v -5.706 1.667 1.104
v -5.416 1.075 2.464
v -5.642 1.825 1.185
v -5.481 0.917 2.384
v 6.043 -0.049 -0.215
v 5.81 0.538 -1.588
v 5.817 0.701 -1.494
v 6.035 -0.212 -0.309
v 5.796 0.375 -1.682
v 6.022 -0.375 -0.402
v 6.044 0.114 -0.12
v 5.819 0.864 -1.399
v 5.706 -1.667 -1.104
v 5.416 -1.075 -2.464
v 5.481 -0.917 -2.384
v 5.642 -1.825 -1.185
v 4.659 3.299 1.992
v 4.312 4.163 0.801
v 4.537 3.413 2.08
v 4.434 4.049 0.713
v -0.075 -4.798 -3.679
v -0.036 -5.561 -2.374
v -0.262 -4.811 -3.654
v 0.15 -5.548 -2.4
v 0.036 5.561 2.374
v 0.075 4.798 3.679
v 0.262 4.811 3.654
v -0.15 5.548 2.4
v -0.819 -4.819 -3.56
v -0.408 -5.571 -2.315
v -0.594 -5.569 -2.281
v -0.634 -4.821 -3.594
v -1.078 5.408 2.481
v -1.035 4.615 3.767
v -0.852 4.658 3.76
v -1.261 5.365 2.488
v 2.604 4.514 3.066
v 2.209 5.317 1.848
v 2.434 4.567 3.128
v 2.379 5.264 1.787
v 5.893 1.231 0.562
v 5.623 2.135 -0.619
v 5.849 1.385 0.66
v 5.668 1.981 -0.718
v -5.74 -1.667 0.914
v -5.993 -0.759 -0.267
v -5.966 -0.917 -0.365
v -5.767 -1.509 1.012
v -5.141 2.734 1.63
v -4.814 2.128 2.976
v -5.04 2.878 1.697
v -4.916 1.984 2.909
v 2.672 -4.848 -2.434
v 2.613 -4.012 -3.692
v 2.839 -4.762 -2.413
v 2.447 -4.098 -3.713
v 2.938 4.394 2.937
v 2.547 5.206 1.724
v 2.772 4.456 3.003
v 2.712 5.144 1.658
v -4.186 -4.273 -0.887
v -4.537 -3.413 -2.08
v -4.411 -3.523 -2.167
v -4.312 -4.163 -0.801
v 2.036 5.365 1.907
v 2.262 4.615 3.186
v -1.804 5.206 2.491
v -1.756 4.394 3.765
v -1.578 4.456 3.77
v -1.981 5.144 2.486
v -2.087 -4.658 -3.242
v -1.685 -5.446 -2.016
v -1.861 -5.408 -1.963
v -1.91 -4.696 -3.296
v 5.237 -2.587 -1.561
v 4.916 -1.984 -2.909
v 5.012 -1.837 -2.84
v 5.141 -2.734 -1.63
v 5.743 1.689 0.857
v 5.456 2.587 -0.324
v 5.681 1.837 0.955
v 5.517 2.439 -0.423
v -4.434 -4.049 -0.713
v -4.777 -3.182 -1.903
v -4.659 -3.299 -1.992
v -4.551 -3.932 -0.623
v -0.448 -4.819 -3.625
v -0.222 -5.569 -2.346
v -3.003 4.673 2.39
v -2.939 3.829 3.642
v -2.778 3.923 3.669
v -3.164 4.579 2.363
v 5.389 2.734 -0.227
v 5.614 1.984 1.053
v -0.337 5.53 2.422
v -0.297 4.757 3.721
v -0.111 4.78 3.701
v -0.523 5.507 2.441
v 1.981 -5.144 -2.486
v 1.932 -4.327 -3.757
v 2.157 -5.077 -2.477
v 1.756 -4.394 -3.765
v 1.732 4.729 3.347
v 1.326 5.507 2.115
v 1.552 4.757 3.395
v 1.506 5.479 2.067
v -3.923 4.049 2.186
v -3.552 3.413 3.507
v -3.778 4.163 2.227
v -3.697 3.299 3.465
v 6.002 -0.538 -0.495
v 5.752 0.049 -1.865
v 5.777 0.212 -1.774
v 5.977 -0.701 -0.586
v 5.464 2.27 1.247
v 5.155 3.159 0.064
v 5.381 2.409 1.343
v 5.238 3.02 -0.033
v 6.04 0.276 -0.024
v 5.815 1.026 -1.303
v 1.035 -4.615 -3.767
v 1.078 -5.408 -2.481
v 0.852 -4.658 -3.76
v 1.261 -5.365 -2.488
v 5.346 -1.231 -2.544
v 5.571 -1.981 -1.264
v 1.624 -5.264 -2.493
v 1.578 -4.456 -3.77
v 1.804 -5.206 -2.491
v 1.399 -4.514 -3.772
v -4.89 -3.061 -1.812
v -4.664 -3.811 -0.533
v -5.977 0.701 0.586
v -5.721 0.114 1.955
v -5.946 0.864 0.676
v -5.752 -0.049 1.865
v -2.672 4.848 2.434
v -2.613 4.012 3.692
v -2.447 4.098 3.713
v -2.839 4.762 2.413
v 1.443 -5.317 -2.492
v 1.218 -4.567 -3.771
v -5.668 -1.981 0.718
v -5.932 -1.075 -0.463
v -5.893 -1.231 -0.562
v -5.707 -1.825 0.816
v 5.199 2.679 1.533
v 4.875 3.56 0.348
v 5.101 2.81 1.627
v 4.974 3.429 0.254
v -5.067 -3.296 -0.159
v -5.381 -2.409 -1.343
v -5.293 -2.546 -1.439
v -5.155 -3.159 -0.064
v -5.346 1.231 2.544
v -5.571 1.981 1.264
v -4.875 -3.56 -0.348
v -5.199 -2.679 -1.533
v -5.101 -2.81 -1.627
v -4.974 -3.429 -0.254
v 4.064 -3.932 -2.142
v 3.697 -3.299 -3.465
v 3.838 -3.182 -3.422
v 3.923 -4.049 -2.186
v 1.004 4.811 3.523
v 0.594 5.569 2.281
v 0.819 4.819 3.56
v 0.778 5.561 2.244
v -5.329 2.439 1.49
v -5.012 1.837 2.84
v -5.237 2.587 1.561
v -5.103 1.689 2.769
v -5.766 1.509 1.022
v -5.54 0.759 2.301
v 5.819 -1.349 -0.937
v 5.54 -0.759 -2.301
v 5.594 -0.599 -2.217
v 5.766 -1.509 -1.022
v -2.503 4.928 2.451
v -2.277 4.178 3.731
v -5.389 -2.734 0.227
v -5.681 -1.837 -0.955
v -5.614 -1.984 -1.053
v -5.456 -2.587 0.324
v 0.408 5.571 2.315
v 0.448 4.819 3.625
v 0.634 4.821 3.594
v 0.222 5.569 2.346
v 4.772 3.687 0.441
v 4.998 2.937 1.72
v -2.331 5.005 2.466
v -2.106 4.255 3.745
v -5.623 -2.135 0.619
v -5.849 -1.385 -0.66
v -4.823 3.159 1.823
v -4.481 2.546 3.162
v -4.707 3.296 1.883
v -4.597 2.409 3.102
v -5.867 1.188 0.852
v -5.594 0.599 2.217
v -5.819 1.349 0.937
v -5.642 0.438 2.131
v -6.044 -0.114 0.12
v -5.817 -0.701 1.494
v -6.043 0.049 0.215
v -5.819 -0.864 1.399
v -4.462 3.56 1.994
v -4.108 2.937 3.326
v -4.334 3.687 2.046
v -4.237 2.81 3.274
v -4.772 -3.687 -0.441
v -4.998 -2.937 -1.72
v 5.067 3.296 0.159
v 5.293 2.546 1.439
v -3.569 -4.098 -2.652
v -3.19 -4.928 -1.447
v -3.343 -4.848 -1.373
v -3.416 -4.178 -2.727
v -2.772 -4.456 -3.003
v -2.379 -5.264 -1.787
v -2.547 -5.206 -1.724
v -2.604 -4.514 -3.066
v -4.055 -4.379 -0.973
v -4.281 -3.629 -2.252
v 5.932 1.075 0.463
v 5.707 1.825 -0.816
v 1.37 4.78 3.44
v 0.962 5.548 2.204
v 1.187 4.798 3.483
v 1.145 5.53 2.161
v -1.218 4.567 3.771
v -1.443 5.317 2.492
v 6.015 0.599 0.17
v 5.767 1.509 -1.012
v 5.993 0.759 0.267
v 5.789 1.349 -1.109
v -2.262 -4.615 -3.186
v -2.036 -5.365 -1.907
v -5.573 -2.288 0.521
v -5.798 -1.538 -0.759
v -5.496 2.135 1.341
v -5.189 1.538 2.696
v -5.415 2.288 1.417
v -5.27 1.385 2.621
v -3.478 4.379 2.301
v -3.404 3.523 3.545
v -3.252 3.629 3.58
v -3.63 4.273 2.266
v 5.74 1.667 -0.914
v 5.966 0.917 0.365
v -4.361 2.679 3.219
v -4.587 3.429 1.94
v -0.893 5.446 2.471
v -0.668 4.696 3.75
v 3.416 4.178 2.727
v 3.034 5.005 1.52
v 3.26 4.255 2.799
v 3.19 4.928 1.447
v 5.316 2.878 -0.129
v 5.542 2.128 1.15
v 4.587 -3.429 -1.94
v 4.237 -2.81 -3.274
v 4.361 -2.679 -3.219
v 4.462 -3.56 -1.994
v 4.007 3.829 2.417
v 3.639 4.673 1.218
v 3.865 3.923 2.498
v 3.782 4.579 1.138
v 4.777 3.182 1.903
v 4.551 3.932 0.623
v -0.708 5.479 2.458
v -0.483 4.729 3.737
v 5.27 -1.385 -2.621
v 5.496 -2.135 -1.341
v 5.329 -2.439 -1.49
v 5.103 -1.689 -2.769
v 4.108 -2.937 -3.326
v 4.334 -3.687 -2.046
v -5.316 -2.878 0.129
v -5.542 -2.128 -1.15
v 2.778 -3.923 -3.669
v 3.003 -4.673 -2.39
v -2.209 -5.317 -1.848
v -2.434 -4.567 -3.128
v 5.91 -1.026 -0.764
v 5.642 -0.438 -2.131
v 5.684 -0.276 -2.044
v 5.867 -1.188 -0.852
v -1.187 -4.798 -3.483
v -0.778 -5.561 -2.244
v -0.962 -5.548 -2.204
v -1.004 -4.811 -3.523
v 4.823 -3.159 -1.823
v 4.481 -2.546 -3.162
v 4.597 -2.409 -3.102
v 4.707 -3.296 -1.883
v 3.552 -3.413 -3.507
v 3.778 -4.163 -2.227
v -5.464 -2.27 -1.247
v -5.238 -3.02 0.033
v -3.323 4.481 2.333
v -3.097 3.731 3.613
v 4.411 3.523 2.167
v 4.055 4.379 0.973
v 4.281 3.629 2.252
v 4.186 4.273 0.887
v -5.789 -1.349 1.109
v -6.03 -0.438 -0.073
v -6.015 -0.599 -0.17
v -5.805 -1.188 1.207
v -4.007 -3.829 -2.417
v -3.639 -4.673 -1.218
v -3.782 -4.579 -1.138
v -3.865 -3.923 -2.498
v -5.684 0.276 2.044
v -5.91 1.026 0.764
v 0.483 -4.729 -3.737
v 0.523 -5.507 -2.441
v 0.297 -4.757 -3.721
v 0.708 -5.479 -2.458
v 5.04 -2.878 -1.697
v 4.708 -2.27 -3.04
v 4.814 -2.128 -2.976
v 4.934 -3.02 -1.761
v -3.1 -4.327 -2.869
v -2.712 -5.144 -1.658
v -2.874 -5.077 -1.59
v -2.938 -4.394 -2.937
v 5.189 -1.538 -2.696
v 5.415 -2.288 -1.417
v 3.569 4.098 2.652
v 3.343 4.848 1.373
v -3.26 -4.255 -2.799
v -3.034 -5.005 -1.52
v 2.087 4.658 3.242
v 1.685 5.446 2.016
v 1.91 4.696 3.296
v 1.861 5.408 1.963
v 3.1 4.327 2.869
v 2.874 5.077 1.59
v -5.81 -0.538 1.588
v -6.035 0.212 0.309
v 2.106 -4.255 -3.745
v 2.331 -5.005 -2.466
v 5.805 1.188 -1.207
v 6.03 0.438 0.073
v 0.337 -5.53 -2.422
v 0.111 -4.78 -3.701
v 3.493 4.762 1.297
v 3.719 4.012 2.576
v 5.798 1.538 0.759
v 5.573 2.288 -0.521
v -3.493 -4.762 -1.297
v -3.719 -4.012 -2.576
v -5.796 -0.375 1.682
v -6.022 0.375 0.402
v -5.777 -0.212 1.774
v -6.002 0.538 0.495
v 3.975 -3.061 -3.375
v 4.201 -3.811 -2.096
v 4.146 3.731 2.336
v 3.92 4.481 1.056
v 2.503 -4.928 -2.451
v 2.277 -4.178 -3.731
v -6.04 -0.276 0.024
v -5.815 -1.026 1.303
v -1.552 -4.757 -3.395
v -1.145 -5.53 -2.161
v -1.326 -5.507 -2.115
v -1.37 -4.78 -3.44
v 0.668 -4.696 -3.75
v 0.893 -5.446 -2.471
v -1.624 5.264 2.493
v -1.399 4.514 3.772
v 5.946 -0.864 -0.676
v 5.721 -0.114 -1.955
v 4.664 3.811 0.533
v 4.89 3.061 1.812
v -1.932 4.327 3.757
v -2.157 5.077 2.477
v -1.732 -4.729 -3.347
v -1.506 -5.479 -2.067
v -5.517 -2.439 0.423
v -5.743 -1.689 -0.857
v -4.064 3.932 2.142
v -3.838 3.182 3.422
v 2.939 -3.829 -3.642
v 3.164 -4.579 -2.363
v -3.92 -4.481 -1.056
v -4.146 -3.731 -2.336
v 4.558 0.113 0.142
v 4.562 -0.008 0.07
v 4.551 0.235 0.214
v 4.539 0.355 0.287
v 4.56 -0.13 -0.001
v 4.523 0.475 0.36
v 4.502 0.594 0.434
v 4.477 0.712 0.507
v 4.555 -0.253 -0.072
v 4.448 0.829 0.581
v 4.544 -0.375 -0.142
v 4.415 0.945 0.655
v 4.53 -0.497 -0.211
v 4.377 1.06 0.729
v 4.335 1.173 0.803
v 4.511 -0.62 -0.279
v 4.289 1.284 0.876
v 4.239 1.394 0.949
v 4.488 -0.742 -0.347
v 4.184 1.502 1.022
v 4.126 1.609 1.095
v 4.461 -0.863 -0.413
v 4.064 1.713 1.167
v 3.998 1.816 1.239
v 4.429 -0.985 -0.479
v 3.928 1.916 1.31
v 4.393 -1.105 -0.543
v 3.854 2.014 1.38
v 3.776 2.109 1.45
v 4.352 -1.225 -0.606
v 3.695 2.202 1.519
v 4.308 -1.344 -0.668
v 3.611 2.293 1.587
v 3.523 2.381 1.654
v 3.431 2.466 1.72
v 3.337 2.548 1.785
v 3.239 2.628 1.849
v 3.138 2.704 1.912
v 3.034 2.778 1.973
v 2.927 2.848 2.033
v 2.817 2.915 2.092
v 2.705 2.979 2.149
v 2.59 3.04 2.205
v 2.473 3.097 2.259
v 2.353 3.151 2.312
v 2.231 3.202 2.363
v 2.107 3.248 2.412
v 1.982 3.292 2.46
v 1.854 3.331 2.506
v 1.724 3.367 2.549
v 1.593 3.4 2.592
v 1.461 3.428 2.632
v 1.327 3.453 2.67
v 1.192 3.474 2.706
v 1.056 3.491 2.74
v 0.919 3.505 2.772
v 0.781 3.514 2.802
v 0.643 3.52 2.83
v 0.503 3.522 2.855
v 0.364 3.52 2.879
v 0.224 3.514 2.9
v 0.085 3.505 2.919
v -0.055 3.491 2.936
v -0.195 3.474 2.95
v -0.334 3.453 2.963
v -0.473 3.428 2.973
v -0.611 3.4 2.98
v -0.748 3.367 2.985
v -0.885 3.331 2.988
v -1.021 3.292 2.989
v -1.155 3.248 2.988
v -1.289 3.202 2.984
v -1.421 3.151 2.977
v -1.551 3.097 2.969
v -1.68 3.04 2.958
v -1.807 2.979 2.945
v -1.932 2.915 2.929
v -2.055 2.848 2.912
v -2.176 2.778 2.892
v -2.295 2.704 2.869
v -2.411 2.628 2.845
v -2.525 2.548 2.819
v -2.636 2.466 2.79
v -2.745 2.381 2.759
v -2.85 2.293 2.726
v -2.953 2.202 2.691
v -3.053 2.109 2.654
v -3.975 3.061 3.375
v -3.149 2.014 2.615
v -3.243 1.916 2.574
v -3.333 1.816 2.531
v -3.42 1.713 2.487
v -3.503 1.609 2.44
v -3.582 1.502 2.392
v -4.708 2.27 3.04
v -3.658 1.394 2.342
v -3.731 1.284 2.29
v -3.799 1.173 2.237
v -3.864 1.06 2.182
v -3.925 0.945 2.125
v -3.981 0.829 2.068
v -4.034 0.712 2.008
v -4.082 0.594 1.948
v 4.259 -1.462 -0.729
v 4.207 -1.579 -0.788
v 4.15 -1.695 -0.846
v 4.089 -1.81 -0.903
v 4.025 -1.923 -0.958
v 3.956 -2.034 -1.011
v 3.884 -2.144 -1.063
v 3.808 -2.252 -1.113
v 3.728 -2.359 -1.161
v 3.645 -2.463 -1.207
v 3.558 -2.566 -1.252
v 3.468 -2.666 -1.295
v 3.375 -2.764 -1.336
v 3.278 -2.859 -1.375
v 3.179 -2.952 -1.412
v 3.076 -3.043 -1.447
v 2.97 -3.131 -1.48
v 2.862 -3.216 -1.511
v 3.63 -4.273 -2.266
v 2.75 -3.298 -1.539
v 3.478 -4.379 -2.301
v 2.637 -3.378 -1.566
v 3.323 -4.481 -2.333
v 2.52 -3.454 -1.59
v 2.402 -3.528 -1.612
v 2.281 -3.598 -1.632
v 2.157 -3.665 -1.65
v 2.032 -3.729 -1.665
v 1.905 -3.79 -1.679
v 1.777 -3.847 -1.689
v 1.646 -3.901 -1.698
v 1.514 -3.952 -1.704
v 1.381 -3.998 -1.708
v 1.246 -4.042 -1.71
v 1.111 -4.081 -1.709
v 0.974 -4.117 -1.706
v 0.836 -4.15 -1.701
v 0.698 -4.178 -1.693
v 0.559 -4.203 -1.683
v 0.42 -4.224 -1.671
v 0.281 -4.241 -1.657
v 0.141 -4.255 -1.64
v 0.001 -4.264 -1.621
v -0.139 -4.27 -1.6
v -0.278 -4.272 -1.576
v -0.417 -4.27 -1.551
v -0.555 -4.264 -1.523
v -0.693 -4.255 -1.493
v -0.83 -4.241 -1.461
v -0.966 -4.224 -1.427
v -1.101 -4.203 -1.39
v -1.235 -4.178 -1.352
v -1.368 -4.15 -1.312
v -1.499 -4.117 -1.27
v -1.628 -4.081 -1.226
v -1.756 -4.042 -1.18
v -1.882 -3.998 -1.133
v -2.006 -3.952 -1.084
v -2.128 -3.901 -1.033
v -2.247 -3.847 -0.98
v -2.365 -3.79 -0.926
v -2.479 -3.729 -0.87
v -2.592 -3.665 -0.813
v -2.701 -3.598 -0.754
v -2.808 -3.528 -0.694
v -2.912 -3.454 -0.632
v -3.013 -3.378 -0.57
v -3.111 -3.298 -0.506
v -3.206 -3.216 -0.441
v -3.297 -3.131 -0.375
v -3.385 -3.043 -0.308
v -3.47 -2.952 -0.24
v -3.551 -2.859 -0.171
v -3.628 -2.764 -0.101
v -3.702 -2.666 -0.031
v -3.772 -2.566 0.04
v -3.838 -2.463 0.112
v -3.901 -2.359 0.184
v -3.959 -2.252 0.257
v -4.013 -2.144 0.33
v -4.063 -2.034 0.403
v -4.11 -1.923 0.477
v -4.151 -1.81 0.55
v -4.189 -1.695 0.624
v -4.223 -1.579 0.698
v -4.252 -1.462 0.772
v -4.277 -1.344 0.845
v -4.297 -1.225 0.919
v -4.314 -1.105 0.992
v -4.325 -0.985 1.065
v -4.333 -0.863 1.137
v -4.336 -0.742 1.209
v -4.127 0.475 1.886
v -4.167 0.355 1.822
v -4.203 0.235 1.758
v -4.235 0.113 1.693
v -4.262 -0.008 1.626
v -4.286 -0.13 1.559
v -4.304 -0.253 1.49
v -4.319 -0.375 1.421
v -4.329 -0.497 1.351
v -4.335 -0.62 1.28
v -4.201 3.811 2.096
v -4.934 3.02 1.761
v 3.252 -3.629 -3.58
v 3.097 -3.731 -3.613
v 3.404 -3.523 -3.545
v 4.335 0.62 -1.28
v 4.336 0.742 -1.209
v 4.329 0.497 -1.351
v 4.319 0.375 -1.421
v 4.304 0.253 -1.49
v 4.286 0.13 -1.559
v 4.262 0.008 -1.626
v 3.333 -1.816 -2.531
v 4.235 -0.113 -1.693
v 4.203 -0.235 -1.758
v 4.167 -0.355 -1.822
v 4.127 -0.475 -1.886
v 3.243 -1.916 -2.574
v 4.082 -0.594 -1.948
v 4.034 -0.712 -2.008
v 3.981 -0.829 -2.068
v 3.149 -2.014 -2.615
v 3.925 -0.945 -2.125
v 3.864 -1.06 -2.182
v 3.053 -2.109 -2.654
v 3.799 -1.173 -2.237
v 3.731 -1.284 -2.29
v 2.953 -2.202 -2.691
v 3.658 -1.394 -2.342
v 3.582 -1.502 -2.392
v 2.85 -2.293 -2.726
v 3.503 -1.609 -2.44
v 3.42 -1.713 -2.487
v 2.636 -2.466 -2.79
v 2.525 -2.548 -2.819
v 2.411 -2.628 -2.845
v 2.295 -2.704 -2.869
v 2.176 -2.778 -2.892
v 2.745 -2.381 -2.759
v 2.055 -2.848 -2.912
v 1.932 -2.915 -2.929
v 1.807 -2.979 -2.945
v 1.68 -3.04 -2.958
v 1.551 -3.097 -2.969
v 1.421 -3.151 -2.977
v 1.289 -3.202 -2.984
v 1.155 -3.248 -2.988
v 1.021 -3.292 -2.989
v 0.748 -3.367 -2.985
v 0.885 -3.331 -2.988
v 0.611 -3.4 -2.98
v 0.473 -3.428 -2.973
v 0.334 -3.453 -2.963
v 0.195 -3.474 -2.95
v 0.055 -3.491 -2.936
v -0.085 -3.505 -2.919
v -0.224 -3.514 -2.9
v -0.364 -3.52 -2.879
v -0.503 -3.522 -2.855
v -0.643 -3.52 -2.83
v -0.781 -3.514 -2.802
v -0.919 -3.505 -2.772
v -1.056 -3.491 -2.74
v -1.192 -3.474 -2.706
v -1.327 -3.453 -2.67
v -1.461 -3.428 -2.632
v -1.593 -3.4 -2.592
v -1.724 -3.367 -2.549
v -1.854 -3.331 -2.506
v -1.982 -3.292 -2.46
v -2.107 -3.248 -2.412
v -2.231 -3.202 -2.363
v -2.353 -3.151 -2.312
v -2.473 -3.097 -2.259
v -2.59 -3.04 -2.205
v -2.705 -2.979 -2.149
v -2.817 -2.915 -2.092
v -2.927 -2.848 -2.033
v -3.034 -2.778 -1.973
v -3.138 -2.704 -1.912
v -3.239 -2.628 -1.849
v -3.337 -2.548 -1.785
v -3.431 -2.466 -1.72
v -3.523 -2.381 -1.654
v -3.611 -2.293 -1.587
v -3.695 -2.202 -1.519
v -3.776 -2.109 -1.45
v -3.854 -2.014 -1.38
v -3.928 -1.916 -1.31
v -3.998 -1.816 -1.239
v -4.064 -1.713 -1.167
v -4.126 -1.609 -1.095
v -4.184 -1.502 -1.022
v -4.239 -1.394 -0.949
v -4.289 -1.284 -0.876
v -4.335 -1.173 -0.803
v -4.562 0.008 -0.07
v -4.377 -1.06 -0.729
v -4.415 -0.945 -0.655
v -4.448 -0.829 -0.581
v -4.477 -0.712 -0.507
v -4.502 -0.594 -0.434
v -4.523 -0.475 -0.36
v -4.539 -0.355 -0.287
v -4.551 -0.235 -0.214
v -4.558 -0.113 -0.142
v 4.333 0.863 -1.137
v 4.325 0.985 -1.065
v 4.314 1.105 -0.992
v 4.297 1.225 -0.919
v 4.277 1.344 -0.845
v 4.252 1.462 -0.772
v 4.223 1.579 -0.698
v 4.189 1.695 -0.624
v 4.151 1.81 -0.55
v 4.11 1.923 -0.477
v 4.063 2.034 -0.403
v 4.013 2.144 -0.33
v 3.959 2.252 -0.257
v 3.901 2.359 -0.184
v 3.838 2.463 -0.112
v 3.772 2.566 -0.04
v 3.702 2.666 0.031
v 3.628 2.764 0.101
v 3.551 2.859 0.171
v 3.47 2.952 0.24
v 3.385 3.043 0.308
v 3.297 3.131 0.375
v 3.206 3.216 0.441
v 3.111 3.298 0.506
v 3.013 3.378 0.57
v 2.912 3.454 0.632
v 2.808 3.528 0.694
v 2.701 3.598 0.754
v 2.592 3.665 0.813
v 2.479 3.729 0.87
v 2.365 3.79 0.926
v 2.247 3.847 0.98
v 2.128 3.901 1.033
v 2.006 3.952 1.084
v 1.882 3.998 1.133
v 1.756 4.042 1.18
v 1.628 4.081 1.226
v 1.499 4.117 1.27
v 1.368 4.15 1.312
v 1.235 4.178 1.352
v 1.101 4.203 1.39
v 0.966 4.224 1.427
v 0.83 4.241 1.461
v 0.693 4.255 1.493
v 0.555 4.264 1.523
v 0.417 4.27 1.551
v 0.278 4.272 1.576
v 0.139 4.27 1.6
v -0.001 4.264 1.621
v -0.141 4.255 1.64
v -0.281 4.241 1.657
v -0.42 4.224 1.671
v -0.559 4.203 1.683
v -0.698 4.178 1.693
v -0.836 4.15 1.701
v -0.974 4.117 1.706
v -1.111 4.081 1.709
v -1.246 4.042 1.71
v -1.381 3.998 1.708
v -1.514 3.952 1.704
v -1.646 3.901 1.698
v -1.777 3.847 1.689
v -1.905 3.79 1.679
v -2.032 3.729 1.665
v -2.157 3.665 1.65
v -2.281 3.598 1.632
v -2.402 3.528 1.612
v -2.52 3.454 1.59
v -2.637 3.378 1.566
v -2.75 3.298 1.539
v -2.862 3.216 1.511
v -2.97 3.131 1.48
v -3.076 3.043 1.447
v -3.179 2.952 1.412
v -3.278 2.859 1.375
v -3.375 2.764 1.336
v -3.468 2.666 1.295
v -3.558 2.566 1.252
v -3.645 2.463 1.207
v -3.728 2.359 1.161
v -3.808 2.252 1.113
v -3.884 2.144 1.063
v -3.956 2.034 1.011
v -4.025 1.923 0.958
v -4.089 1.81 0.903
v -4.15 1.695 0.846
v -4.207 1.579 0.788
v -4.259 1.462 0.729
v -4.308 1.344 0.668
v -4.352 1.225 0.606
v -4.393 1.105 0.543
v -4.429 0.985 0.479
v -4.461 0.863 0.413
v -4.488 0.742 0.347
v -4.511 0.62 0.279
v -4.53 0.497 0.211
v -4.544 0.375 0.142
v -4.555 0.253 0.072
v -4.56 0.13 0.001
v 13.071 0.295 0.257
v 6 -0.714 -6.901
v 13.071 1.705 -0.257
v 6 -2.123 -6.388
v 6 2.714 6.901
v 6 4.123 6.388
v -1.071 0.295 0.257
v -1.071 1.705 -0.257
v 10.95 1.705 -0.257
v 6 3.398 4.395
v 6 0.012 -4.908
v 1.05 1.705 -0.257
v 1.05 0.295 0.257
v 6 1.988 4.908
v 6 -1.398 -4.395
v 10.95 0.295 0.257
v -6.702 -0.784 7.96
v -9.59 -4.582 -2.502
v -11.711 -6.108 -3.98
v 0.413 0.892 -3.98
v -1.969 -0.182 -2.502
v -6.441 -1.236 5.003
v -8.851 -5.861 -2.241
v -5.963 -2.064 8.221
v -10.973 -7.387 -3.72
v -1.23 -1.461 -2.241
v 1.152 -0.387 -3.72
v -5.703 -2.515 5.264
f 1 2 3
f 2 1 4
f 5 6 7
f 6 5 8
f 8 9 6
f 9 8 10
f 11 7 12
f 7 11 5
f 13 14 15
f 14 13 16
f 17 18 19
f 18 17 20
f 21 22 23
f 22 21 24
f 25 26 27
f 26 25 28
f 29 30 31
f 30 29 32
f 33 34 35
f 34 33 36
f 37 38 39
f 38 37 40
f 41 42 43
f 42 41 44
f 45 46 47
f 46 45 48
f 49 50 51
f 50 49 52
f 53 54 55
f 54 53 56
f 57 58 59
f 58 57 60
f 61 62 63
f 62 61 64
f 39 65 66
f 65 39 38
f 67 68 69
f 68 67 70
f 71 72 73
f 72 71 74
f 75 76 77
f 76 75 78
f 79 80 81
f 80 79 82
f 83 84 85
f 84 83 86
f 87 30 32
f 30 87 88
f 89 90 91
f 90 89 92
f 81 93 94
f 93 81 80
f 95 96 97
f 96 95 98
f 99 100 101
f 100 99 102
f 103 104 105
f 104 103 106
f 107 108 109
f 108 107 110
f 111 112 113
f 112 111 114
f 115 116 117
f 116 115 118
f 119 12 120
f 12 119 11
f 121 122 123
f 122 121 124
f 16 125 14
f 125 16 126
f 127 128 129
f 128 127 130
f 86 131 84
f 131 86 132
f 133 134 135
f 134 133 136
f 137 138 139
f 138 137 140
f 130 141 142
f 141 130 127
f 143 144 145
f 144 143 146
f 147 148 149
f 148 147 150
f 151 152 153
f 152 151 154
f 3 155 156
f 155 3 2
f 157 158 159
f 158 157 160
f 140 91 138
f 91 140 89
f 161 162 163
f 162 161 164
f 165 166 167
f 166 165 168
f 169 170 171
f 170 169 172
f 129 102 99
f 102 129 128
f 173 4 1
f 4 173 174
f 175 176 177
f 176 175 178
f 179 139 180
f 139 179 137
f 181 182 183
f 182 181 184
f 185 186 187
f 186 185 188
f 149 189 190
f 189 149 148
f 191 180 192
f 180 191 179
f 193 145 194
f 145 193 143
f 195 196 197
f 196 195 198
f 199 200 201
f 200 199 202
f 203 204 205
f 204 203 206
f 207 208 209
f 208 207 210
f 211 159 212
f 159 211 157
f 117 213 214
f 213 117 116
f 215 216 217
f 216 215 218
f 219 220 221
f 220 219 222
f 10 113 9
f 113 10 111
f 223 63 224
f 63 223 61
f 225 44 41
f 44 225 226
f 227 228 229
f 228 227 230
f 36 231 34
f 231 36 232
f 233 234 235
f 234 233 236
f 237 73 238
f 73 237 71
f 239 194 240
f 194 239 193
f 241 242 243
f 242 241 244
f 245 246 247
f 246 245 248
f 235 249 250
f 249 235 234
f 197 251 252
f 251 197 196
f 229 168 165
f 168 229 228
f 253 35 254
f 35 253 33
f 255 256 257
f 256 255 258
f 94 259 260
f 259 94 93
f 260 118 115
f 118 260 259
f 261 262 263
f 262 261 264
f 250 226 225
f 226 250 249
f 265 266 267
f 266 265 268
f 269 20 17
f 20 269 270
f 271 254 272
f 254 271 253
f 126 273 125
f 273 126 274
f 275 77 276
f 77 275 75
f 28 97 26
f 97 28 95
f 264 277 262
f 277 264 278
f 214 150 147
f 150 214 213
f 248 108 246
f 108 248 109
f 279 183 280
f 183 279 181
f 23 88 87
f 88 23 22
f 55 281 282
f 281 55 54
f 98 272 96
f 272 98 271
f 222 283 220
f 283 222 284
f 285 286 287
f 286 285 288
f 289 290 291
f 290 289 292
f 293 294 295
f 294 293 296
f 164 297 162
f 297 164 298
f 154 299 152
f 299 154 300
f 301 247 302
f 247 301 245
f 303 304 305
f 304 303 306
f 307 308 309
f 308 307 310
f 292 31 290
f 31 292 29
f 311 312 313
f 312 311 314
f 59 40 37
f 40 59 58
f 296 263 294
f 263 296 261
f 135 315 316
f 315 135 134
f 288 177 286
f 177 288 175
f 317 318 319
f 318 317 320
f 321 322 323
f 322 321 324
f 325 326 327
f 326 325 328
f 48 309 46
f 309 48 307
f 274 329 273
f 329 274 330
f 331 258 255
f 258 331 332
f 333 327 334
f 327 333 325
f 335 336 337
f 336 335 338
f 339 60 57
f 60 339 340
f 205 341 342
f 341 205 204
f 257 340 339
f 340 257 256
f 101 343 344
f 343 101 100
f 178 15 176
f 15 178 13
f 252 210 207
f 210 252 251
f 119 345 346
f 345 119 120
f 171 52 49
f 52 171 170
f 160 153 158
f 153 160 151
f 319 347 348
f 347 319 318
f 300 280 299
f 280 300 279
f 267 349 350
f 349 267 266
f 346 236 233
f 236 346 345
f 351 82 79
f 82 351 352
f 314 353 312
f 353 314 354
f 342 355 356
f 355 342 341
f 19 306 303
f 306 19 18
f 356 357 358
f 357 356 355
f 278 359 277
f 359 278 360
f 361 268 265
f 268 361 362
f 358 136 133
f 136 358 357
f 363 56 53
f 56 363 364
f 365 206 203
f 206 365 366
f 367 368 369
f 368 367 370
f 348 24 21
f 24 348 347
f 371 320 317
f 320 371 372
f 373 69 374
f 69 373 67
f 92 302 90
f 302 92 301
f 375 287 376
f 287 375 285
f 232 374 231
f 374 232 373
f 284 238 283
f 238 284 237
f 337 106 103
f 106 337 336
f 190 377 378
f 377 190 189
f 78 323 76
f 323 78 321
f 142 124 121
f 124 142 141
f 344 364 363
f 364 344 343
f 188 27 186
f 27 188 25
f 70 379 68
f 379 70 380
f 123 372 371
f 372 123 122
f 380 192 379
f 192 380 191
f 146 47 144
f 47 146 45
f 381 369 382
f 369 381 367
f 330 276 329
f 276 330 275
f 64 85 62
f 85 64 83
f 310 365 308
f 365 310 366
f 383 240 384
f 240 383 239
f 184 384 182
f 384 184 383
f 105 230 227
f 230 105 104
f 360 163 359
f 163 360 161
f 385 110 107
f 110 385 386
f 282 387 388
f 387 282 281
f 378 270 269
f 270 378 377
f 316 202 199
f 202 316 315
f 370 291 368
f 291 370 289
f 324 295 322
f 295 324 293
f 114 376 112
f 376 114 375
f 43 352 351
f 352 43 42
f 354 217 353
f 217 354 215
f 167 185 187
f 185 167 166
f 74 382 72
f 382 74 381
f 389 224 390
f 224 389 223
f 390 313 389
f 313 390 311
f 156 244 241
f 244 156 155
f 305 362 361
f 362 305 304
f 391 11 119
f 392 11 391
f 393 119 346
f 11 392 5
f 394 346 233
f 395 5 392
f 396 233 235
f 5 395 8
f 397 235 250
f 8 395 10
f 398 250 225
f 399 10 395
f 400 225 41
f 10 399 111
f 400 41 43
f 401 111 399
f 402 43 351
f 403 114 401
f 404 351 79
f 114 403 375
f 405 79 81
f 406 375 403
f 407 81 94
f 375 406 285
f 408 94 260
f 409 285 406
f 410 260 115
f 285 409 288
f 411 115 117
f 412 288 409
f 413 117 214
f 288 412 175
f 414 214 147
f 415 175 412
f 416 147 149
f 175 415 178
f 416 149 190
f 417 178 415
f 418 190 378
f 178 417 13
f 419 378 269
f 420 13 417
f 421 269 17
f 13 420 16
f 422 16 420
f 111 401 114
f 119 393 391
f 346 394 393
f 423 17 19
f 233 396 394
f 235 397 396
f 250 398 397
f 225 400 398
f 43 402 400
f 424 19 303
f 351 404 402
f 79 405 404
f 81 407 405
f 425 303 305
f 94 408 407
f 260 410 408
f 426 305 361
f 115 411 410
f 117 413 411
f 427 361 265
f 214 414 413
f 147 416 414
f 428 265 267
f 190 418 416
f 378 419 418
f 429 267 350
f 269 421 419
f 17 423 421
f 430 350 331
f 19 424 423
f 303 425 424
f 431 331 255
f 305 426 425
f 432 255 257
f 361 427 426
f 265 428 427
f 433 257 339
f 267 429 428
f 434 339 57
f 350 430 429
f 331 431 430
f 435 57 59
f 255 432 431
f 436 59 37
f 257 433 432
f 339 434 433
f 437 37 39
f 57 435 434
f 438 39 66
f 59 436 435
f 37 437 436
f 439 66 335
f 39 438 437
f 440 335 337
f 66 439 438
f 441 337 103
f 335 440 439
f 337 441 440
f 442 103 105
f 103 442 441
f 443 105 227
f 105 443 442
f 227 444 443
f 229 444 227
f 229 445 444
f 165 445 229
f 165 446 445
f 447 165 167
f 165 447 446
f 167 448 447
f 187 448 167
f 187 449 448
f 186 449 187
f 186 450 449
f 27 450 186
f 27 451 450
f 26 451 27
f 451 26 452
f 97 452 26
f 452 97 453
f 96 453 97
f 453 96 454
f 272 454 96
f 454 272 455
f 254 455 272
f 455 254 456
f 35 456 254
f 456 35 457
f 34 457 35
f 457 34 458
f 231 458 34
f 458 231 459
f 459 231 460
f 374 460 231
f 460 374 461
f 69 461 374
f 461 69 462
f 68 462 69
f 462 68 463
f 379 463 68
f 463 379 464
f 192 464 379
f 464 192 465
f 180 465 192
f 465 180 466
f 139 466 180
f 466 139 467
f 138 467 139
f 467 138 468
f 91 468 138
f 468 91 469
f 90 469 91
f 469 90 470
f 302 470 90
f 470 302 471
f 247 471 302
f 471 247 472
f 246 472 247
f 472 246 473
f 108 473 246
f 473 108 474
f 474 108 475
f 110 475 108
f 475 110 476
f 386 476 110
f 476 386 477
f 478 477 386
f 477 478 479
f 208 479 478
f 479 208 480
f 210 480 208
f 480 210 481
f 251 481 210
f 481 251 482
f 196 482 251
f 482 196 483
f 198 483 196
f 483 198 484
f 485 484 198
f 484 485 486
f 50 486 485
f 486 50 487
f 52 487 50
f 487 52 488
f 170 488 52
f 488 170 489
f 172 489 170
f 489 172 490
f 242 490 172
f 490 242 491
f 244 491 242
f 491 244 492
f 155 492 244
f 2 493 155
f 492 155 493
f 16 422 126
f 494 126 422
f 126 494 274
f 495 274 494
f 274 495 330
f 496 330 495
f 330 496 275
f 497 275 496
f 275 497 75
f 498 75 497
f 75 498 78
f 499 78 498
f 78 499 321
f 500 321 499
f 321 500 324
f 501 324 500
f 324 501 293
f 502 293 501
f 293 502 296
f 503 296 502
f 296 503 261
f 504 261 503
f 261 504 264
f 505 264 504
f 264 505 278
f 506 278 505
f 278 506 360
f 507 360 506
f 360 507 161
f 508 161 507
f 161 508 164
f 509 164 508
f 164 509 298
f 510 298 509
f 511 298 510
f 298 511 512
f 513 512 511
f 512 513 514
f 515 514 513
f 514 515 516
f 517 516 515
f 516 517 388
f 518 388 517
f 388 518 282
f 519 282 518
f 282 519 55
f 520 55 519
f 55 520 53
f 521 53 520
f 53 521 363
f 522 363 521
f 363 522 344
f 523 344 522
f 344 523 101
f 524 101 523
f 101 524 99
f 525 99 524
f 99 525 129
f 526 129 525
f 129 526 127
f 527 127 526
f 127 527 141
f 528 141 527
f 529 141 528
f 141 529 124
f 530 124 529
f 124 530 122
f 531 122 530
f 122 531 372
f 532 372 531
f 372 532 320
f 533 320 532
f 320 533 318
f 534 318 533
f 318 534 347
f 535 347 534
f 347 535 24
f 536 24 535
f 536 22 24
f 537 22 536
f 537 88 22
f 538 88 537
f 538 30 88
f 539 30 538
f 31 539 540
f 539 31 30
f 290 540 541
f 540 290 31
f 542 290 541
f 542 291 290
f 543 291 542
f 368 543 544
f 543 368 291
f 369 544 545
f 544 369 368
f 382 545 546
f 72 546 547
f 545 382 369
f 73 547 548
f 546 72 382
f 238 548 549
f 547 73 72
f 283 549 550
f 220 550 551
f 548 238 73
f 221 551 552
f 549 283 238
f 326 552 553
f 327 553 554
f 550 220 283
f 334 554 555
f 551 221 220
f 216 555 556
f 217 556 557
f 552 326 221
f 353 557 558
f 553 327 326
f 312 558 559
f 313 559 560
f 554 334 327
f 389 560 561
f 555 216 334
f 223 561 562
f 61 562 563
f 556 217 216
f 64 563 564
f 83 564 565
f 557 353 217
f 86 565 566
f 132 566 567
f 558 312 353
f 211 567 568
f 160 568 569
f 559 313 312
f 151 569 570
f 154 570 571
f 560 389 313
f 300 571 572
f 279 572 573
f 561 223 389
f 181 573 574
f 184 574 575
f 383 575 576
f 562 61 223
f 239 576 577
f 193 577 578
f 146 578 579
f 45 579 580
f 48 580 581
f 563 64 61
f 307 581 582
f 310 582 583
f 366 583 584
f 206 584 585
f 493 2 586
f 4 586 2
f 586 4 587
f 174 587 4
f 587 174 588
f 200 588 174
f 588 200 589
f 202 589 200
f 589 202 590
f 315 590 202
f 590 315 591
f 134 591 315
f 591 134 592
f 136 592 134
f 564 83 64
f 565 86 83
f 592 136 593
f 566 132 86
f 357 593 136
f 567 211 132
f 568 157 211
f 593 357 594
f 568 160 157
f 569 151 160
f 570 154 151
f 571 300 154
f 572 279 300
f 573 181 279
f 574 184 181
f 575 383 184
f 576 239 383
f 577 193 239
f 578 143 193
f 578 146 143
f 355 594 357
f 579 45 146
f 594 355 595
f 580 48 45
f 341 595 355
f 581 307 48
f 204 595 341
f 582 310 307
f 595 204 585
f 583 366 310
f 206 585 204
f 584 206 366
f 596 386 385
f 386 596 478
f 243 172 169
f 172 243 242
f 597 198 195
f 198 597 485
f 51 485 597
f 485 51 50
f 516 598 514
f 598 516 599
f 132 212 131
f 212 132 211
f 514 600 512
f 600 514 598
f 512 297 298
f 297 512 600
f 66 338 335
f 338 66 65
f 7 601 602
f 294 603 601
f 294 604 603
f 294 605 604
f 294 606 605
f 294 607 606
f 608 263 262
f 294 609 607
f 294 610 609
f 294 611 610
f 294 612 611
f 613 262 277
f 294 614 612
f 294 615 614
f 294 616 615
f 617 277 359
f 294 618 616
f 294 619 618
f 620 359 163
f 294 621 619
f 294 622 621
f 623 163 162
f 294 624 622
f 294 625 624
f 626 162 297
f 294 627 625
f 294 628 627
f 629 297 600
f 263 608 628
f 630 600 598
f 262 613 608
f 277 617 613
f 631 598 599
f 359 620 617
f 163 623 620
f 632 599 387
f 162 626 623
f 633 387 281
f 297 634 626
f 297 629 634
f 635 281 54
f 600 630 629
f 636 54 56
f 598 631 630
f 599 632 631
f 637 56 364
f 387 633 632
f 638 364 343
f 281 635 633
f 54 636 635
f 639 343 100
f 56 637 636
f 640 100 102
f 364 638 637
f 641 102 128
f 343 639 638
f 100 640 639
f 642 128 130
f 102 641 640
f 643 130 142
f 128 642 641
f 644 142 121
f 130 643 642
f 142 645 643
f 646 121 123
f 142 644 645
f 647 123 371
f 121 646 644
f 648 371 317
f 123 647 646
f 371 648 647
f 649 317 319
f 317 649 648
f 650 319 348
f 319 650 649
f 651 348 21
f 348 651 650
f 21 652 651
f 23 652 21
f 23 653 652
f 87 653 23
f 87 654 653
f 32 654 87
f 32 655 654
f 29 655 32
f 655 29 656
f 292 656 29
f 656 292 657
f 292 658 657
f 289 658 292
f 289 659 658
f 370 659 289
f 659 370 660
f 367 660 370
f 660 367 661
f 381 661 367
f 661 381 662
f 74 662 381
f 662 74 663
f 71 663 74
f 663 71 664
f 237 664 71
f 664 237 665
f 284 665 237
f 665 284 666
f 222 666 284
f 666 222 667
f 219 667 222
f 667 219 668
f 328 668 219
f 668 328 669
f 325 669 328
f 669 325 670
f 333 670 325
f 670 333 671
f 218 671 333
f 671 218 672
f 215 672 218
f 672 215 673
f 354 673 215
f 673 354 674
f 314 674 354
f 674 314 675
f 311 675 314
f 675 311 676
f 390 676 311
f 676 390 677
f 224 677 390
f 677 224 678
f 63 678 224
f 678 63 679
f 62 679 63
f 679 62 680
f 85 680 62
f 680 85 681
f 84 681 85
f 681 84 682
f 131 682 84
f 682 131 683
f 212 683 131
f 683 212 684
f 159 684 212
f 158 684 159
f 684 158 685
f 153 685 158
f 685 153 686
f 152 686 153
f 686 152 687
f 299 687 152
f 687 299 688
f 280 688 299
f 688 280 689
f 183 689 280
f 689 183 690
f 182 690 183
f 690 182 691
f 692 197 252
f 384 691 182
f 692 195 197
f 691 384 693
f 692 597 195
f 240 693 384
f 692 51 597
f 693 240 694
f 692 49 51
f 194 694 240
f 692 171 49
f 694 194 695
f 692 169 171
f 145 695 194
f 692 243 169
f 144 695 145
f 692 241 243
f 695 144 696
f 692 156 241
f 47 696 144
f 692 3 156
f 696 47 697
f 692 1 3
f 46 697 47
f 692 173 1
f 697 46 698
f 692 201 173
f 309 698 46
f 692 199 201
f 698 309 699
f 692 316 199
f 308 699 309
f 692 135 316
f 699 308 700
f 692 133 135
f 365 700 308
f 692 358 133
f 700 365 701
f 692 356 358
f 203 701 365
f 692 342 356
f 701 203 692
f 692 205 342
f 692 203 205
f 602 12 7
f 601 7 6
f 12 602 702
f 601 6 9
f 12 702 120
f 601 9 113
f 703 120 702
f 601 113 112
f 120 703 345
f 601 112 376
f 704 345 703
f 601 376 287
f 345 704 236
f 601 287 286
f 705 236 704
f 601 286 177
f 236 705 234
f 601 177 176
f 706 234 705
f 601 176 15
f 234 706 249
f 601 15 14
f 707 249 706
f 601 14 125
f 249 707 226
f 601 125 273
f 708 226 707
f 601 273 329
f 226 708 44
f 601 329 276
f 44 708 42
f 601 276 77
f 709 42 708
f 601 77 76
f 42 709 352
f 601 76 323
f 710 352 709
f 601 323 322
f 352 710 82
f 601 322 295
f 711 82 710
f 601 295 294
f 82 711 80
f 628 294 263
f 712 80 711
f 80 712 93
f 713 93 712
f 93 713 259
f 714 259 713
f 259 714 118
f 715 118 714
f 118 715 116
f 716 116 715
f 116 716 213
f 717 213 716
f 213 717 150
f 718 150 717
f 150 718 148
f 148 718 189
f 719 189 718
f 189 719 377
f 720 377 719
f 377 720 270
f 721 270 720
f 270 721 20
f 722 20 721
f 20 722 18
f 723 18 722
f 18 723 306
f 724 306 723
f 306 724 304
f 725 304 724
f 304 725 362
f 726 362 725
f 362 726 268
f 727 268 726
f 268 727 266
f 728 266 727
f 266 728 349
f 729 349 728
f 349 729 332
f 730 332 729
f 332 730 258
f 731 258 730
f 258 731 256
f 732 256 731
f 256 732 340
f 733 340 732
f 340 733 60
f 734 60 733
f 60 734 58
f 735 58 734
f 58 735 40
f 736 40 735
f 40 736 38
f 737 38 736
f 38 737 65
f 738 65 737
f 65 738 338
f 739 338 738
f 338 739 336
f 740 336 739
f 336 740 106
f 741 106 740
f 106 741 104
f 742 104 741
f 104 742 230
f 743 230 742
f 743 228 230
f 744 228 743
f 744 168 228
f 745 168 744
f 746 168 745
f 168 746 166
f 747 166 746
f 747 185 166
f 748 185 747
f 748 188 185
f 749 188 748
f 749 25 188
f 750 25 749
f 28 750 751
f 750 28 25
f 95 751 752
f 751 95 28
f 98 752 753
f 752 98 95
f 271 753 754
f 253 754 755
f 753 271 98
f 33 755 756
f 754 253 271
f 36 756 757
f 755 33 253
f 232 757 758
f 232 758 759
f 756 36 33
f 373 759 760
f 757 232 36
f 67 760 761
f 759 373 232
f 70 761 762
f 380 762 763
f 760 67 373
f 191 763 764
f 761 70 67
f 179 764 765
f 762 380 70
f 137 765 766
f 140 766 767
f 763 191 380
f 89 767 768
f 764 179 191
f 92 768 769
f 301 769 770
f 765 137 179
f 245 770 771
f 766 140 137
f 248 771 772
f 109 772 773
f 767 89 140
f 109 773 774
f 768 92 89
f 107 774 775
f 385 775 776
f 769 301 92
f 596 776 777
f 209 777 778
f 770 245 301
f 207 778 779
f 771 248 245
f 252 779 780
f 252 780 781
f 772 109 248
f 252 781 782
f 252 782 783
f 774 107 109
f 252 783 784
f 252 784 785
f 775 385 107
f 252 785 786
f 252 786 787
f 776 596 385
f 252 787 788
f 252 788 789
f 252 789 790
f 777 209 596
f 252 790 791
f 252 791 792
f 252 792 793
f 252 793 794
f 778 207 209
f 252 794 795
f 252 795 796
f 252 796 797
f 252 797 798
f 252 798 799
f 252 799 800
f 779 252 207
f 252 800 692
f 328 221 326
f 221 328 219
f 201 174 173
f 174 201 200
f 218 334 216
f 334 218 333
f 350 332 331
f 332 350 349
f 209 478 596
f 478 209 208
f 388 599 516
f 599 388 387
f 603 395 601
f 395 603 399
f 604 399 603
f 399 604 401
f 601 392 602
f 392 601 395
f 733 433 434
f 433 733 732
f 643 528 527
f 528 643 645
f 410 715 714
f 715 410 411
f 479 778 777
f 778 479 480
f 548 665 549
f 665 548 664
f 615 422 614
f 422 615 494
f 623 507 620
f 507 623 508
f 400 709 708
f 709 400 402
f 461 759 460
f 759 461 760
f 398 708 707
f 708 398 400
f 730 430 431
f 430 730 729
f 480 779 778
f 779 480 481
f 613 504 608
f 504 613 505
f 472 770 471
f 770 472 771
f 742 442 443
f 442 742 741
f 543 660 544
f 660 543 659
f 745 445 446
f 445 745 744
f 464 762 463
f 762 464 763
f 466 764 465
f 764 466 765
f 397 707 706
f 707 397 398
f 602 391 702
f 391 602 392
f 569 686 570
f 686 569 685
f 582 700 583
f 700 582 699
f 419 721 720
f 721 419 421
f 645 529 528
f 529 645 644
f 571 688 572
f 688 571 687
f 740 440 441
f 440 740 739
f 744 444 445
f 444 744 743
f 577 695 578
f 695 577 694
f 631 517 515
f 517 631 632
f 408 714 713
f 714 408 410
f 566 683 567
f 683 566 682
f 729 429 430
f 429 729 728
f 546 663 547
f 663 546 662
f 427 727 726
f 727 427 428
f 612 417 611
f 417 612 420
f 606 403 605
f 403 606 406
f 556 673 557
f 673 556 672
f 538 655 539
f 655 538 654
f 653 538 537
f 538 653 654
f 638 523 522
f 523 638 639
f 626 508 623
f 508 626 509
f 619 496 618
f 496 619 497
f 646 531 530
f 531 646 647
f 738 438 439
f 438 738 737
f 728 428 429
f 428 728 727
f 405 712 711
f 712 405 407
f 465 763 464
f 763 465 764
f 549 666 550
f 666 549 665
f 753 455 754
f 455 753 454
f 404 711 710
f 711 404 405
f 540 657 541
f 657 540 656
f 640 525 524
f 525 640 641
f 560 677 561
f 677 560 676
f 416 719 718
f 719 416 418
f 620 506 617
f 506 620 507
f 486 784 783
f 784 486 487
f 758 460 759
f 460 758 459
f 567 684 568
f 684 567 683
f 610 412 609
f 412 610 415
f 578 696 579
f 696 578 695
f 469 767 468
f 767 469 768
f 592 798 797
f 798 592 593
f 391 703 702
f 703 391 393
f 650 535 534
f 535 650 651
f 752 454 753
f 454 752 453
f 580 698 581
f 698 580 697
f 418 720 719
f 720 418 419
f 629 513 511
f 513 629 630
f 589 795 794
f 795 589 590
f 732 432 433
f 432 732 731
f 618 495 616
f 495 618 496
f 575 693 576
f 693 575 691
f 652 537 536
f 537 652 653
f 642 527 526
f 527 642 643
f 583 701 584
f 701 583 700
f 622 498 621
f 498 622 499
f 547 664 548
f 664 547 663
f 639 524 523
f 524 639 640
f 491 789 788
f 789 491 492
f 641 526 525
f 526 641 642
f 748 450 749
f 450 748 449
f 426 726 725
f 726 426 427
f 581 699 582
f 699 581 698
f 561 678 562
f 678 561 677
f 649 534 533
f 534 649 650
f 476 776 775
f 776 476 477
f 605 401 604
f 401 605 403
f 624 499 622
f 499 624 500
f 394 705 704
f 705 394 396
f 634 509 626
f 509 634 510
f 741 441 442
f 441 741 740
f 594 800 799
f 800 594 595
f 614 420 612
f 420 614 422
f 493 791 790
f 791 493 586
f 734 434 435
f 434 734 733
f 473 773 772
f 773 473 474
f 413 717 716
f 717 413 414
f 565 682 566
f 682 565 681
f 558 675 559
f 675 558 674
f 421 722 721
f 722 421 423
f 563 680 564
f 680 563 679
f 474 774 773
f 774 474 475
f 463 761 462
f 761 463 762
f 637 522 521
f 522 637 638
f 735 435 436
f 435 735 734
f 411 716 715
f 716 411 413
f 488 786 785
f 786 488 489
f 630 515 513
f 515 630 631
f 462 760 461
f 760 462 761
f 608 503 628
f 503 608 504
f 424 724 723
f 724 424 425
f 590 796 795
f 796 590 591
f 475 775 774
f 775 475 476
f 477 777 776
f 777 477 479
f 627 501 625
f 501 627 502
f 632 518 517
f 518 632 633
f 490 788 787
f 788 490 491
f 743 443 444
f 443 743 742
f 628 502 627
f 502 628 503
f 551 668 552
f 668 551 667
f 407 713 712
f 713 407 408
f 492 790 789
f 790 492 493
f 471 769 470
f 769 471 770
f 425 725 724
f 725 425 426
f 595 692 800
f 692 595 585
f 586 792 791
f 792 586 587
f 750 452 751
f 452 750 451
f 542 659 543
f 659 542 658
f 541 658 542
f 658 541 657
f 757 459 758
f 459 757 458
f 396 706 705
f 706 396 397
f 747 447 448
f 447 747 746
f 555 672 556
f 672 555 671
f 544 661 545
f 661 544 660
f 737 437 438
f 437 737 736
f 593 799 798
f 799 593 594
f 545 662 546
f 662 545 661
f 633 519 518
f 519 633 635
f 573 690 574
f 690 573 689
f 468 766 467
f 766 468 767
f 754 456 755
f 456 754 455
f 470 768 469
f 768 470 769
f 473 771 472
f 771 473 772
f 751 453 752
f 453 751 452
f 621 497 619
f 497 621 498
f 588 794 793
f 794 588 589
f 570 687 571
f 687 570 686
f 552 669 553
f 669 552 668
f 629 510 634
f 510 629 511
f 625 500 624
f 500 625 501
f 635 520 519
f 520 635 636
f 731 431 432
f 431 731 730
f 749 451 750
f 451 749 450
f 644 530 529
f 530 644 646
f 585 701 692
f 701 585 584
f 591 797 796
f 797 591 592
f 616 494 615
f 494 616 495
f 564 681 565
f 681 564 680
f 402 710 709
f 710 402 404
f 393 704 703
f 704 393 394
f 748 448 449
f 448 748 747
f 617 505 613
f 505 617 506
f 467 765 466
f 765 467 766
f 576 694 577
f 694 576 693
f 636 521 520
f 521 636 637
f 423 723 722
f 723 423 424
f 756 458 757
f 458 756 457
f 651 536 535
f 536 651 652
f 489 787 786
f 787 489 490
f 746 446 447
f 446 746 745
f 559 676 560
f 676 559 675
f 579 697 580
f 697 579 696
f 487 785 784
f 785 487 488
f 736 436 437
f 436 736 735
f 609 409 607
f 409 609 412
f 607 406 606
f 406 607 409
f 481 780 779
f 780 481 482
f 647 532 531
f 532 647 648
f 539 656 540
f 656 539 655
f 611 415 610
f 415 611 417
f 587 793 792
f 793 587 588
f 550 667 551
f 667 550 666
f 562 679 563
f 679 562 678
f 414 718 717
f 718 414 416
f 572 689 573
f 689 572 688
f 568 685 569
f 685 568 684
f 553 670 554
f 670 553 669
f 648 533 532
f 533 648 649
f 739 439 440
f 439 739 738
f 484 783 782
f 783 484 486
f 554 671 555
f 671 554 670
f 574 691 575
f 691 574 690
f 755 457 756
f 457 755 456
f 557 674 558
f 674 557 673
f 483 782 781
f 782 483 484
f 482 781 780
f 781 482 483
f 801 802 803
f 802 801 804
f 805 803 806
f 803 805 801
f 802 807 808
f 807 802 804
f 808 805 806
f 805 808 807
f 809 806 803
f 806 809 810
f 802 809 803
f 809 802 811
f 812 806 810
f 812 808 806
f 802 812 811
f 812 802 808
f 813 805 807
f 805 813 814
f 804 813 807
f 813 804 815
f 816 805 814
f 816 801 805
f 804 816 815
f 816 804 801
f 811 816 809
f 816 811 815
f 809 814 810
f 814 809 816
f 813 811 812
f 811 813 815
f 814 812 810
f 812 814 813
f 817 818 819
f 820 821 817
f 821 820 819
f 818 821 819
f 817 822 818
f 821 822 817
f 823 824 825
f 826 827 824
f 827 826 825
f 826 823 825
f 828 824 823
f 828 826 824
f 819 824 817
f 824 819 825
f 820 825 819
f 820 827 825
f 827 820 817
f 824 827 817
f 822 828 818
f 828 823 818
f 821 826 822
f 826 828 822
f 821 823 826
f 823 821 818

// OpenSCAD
$fn=200;

rotate([30, 10, 0]) {
    difference() {
        color("white") cylinder(1.5,6,6,true);
        cylinder(2,4.5,4.5,true);
    }
}

translate([6, 1, 0]) {
    rotate([-20,0,0]) rotate([0,45,0]) rotate([0,0,0]) {
        difference() {
            color("blue") cube([10, 1.5, 10], true);
            cube([7, 2, 7], true);
        }
    }
}

translate([-6, -2, 0]) {
rotate([80, 0, 30]) {
linear_extrude(height=1.5, scale=[1,1], slices=1, twist=0)
difference() {
    color("red") polygon( points=[[-7,-tan(30)*7],[7,-tan(30)*7],[0,7*sqrt(3)-tan(30)*7]]);
    polygon( points=[[-4.4,-tan(30)*4.4],[4.4,-tan(30)*4.4],[0,4.4*sqrt(3)-tan(30)*4.4]] );
}}}
